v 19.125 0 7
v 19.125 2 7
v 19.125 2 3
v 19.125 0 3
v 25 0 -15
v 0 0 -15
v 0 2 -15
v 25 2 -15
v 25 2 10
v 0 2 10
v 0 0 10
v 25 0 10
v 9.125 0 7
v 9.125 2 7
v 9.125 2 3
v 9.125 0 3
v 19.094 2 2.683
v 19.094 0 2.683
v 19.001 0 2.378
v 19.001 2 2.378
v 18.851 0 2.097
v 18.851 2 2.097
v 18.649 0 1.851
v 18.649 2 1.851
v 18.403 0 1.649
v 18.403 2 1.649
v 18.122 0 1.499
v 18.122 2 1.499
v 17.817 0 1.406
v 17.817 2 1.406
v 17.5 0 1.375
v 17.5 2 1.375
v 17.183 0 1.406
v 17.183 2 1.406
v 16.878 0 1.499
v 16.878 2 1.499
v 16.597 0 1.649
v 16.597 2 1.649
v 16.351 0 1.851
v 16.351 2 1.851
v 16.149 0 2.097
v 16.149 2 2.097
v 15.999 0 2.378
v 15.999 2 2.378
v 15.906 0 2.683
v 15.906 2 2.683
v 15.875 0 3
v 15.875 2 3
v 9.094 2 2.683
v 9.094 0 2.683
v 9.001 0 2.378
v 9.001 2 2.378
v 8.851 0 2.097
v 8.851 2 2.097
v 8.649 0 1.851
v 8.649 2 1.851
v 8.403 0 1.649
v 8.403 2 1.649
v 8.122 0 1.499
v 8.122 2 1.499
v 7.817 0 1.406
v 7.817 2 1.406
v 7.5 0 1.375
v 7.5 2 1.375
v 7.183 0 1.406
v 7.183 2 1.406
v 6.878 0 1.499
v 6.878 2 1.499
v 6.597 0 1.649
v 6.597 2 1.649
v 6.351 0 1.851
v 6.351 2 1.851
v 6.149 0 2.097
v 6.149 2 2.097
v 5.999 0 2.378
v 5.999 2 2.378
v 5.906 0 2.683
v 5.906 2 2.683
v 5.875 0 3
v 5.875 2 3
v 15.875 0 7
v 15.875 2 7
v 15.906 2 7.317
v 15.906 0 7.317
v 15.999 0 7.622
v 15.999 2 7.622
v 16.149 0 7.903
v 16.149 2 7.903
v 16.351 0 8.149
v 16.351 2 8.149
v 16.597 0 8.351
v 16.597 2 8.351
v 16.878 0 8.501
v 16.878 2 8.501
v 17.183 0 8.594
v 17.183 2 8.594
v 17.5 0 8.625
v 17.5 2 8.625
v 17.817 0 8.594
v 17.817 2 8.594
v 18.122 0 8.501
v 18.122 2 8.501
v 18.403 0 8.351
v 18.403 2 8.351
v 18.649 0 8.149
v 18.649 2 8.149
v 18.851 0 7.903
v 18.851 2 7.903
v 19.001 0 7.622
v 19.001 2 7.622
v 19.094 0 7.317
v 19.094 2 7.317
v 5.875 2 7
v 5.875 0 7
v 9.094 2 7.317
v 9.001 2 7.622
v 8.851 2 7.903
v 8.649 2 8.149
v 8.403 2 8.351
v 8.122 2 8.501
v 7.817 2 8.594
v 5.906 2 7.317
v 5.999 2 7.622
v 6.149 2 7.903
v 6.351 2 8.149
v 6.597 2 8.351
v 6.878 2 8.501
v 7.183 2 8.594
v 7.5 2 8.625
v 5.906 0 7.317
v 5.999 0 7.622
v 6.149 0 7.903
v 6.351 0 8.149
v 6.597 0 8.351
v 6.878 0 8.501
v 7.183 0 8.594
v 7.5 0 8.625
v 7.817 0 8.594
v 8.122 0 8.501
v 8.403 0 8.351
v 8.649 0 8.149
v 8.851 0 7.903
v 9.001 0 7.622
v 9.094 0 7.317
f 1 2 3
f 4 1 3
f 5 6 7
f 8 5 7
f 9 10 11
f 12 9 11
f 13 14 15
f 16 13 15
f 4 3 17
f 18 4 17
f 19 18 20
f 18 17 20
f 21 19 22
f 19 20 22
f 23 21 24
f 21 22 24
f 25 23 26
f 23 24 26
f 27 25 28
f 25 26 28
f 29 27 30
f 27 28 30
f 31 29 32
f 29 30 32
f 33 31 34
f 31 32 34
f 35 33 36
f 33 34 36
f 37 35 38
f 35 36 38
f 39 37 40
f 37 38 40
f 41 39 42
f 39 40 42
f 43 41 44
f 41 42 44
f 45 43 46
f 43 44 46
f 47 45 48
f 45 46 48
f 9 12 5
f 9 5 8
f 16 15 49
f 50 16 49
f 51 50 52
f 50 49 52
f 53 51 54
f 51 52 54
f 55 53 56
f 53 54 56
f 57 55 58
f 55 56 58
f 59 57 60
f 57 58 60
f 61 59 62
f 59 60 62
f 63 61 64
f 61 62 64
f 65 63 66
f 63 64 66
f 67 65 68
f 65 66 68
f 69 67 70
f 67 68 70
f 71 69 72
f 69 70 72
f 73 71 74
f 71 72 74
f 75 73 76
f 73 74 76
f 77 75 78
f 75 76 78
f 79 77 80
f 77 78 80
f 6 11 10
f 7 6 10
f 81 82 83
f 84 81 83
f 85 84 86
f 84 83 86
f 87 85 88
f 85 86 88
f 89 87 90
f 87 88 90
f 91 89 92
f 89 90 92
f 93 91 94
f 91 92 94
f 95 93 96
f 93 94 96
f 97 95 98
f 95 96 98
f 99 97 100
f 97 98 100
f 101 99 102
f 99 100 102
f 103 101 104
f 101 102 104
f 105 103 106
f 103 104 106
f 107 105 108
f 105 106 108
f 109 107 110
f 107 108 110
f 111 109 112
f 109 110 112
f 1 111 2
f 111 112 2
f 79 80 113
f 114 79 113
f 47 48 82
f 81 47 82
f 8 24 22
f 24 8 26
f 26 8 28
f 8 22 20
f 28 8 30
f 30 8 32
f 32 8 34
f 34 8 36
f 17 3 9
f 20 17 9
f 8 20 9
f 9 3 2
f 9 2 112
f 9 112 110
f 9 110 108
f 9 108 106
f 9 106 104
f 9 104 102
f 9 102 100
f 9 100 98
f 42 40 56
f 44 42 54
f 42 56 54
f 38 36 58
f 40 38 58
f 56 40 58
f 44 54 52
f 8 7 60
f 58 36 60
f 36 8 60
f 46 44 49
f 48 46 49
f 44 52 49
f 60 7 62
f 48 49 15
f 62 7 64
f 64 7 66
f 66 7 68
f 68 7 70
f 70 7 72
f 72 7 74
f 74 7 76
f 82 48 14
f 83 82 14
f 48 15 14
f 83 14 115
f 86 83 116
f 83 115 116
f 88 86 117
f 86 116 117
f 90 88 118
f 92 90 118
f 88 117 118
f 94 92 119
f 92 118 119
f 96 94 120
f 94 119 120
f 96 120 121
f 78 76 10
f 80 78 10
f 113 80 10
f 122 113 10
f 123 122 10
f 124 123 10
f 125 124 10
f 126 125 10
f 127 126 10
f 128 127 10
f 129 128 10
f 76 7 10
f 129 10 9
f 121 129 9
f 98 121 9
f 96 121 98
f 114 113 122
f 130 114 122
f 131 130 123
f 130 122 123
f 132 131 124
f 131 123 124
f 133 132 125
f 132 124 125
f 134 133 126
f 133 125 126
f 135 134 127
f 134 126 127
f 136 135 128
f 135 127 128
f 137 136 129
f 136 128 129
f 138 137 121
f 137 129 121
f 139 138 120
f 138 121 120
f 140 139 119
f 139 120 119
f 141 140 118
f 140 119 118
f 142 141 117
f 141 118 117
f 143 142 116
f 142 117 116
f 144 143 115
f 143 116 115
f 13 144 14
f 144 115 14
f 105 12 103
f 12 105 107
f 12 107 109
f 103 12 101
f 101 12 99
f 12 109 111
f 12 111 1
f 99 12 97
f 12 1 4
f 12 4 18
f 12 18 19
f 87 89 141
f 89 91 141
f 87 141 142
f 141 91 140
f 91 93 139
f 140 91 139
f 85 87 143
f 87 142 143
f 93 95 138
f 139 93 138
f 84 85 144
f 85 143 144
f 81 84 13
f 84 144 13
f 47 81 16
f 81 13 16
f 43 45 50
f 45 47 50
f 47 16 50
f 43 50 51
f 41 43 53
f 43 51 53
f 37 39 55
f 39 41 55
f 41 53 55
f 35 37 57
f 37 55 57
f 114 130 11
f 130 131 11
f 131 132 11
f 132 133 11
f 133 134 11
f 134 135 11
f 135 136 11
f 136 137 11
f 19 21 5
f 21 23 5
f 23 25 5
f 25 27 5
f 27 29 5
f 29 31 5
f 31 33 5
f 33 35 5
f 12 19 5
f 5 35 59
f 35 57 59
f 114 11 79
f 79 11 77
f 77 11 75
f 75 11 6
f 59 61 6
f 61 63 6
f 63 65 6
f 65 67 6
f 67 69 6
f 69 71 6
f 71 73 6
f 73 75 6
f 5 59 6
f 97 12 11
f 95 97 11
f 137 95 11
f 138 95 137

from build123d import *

# Parameters (mm, degrees)
F1_DEPTH = 25
F3_DEPTH = 25


with BuildPart() as f1:
    # F0 (on Right) → F1 (new body)
    with BuildSketch(Plane.YZ):
        Polygon((0, 10), (0, 0), (0, -15), (2, -15), (2, 2), (2, 10), align=None)
    extrude(amount=F1_DEPTH)

    # F2 (on face) → F3 (cut)
    with BuildSketch(Plane(origin=(0, 2, 0), x_dir=(-1, 0, 0), z_dir=(0, 1, 0))):
        with BuildLine():
            Line((-15.875, 3), (-15.875, 7))
            ThreePointArc((-15.875, 7), (-17.5, 8.625), (-19.125, 7))
            Line((-19.125, 7), (-19.125, 3))
            ThreePointArc((-19.125, 3), (-17.5, 1.375), (-15.875, 3))
        make_face()
        with BuildLine():
            Line((-5.875, 3), (-5.875, 7))
            ThreePointArc((-5.875, 7), (-7.5, 8.625), (-9.125, 7))
            Line((-9.125, 7), (-9.125, 3))
            ThreePointArc((-9.125, 3), (-7.5, 1.375), (-5.875, 3))
        make_face()
    extrude(amount=-F3_DEPTH, mode=Mode.SUBTRACT)


solid = f1.part
